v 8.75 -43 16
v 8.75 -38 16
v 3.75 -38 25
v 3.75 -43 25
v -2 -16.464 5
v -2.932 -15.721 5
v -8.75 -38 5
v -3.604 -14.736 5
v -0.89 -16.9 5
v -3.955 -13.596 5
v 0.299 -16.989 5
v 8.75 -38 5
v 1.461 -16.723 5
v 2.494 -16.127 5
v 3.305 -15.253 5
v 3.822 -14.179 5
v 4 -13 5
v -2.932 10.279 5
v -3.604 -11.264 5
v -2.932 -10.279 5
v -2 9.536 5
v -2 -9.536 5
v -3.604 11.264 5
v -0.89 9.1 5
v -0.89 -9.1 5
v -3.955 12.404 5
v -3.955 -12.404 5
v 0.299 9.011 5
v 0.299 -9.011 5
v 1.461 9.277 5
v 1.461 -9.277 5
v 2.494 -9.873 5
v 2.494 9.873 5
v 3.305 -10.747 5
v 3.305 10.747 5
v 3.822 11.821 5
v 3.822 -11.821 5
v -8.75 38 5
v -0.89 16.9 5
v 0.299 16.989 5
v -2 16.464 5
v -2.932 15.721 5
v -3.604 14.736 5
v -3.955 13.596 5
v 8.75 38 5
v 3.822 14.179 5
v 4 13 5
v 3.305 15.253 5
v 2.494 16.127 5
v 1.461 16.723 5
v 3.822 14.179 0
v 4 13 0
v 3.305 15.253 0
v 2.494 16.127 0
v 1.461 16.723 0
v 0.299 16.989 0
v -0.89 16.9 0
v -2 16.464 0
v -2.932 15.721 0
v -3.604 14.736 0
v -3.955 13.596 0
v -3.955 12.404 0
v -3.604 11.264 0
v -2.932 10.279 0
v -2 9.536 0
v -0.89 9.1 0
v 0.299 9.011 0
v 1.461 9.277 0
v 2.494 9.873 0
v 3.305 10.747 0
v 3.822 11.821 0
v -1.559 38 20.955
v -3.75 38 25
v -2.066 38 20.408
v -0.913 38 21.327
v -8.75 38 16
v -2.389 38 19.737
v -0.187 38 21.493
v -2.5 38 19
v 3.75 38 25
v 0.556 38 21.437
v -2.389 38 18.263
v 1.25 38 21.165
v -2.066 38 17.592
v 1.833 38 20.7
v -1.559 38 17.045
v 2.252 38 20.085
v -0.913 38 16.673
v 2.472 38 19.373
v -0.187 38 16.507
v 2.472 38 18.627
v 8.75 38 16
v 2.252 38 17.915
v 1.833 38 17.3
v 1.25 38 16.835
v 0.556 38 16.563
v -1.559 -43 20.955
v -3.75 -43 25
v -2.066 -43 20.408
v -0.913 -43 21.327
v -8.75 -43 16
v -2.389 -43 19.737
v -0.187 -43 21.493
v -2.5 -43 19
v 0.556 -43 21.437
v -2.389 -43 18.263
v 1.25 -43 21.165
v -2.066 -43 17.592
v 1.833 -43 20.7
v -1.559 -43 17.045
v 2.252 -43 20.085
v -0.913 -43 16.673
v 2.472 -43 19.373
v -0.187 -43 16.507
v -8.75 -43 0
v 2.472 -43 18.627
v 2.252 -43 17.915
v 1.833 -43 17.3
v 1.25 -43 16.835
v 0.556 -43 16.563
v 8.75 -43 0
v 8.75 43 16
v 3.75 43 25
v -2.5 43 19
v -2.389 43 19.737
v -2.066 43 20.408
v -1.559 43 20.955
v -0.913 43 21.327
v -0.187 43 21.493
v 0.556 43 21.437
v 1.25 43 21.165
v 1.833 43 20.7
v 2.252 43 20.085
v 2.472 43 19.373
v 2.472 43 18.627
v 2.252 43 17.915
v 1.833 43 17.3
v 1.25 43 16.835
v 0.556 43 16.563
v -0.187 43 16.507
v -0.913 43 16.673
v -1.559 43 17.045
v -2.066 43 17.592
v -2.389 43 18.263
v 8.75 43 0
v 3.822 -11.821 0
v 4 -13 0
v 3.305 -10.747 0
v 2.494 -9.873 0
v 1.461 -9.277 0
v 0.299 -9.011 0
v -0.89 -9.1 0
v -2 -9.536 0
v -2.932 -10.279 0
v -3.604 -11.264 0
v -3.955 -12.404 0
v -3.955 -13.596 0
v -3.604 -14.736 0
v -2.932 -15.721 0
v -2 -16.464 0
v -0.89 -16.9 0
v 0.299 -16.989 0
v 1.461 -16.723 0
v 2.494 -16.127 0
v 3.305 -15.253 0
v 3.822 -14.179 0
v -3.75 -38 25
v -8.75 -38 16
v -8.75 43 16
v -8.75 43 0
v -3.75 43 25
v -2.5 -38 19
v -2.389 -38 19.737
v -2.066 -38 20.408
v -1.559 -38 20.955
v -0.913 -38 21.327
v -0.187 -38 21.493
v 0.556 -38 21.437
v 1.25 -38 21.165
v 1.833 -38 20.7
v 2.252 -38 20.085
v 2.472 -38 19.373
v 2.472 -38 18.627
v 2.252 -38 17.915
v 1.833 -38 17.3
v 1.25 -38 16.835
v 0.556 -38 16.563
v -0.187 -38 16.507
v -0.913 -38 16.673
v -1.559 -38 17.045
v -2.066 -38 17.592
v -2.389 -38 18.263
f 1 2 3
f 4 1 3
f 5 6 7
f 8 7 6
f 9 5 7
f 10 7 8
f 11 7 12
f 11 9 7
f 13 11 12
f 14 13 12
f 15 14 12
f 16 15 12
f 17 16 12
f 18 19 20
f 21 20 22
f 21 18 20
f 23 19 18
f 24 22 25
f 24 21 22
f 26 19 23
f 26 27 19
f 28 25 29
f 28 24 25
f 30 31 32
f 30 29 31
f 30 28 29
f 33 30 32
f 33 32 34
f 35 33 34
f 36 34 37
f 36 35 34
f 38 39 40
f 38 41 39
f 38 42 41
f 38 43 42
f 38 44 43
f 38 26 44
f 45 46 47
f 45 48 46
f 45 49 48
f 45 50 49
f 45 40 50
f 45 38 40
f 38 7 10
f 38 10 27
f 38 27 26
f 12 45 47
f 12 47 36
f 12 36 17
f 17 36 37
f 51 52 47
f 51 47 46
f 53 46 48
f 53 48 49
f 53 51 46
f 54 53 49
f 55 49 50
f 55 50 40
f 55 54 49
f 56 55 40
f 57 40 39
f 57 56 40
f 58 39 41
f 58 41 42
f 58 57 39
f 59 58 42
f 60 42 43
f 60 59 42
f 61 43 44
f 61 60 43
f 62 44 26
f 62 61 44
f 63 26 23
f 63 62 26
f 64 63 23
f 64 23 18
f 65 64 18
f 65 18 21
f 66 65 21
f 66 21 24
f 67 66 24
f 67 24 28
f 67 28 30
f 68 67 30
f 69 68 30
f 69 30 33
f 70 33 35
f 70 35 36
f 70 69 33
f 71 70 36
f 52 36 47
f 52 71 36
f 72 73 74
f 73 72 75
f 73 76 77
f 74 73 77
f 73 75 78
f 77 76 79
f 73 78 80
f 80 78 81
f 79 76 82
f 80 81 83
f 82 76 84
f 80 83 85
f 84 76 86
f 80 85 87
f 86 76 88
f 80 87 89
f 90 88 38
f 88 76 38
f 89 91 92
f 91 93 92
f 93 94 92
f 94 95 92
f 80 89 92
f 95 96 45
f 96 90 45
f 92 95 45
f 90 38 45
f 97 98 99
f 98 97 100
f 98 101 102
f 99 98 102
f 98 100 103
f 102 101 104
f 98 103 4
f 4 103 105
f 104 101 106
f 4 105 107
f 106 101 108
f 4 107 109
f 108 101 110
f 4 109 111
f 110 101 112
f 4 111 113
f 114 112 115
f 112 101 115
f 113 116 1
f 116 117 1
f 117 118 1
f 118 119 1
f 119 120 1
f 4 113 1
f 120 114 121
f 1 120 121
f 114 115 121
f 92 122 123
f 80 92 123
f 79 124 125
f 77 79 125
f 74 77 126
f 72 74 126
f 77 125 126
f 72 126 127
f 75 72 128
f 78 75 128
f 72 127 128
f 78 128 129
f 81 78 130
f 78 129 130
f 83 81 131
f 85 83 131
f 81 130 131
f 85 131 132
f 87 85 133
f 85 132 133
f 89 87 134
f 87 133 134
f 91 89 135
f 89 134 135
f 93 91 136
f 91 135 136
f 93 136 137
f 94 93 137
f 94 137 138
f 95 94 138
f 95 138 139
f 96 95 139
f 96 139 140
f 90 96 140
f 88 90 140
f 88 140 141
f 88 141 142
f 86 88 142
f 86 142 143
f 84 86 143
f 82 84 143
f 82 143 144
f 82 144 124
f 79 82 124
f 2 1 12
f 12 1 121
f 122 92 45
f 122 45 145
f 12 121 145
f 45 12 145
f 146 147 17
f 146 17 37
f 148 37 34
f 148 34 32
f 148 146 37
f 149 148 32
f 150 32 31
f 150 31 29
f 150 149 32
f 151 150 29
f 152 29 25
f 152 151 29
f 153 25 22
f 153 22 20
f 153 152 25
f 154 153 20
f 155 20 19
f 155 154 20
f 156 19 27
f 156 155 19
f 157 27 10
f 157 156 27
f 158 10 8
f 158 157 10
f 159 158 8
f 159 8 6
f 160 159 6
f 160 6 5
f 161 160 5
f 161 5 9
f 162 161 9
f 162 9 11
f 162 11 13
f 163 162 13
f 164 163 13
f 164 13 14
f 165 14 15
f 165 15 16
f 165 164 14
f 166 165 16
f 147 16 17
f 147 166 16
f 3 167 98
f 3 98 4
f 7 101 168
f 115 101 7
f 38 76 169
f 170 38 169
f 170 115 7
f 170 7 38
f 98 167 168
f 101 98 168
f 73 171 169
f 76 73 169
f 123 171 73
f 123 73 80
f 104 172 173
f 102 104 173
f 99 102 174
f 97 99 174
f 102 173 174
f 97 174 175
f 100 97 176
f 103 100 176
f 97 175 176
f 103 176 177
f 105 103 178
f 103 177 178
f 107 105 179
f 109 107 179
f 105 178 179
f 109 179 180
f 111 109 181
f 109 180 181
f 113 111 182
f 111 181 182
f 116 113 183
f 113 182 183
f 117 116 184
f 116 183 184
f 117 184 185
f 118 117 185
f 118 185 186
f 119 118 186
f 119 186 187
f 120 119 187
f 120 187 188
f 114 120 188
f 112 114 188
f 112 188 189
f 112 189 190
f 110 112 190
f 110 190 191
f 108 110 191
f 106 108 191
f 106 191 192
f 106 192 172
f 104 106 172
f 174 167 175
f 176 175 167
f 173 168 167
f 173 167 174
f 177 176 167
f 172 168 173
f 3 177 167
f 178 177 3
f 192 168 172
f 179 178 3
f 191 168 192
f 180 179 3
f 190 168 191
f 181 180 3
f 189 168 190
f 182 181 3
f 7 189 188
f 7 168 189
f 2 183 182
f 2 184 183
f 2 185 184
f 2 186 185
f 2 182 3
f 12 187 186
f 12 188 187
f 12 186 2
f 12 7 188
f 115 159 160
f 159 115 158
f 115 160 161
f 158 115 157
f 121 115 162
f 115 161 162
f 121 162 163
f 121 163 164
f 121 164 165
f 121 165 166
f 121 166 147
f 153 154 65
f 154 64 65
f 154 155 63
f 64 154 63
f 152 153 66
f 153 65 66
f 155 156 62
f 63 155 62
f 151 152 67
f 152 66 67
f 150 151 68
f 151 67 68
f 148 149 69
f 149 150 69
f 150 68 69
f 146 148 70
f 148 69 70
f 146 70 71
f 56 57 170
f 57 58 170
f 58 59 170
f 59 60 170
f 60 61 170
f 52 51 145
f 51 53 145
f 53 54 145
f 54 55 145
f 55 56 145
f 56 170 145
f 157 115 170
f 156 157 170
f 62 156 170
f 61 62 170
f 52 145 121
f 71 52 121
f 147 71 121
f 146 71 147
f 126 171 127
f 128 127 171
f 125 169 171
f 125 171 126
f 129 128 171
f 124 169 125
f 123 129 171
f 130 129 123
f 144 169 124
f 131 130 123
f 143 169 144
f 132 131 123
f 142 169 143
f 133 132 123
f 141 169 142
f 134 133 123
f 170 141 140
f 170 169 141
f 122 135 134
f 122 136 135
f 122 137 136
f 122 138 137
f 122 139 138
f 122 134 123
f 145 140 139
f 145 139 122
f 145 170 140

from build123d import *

# Parameters (mm, degrees)
F0_W     = 17.5
F0_H     = 76
F0_R     = 4
F1_DEPTH = 5
F0_H_2   = 5
F2_DEPTH = 25
F3_R     = 2.5
F4_DEPTH = 100


with BuildPart() as f1:
    # F0 (on Top) → F1 (new body)
    with BuildSketch(Plane.XY):
        Rectangle(F0_W, F0_H)
        with Locations((0, -13)):
            Circle(F0_R, mode=Mode.SUBTRACT)
        with Locations((0, 13)):
            Circle(F0_R, mode=Mode.SUBTRACT)
    extrude(amount=F1_DEPTH)

    # F0 (on Top) → F2 (join)
    with BuildSketch(Plane.XY):
        with Locations((0, 40.5)):
            Rectangle(F0_W, F0_H_2)
        with Locations((0, -40.5)):
            Rectangle(F0_W, F0_H_2)
    extrude(amount=F2_DEPTH)

    # F3 (on face) → F4 (cut)
    with BuildSketch(Plane(origin=(0, 43, 0), x_dir=(-1, 0, 0), z_dir=(0, 1, 0))):
        Polygon((3.75, 25), (8.75, 16), (8.75, 25), align=None)
        Polygon((-8.75, 25), (-8.75, 16), (-3.75, 25), align=None)
        with Locations((0, 19)):
            Circle(F3_R)
    extrude(amount=-F4_DEPTH, mode=Mode.SUBTRACT)


solid = f1.part
